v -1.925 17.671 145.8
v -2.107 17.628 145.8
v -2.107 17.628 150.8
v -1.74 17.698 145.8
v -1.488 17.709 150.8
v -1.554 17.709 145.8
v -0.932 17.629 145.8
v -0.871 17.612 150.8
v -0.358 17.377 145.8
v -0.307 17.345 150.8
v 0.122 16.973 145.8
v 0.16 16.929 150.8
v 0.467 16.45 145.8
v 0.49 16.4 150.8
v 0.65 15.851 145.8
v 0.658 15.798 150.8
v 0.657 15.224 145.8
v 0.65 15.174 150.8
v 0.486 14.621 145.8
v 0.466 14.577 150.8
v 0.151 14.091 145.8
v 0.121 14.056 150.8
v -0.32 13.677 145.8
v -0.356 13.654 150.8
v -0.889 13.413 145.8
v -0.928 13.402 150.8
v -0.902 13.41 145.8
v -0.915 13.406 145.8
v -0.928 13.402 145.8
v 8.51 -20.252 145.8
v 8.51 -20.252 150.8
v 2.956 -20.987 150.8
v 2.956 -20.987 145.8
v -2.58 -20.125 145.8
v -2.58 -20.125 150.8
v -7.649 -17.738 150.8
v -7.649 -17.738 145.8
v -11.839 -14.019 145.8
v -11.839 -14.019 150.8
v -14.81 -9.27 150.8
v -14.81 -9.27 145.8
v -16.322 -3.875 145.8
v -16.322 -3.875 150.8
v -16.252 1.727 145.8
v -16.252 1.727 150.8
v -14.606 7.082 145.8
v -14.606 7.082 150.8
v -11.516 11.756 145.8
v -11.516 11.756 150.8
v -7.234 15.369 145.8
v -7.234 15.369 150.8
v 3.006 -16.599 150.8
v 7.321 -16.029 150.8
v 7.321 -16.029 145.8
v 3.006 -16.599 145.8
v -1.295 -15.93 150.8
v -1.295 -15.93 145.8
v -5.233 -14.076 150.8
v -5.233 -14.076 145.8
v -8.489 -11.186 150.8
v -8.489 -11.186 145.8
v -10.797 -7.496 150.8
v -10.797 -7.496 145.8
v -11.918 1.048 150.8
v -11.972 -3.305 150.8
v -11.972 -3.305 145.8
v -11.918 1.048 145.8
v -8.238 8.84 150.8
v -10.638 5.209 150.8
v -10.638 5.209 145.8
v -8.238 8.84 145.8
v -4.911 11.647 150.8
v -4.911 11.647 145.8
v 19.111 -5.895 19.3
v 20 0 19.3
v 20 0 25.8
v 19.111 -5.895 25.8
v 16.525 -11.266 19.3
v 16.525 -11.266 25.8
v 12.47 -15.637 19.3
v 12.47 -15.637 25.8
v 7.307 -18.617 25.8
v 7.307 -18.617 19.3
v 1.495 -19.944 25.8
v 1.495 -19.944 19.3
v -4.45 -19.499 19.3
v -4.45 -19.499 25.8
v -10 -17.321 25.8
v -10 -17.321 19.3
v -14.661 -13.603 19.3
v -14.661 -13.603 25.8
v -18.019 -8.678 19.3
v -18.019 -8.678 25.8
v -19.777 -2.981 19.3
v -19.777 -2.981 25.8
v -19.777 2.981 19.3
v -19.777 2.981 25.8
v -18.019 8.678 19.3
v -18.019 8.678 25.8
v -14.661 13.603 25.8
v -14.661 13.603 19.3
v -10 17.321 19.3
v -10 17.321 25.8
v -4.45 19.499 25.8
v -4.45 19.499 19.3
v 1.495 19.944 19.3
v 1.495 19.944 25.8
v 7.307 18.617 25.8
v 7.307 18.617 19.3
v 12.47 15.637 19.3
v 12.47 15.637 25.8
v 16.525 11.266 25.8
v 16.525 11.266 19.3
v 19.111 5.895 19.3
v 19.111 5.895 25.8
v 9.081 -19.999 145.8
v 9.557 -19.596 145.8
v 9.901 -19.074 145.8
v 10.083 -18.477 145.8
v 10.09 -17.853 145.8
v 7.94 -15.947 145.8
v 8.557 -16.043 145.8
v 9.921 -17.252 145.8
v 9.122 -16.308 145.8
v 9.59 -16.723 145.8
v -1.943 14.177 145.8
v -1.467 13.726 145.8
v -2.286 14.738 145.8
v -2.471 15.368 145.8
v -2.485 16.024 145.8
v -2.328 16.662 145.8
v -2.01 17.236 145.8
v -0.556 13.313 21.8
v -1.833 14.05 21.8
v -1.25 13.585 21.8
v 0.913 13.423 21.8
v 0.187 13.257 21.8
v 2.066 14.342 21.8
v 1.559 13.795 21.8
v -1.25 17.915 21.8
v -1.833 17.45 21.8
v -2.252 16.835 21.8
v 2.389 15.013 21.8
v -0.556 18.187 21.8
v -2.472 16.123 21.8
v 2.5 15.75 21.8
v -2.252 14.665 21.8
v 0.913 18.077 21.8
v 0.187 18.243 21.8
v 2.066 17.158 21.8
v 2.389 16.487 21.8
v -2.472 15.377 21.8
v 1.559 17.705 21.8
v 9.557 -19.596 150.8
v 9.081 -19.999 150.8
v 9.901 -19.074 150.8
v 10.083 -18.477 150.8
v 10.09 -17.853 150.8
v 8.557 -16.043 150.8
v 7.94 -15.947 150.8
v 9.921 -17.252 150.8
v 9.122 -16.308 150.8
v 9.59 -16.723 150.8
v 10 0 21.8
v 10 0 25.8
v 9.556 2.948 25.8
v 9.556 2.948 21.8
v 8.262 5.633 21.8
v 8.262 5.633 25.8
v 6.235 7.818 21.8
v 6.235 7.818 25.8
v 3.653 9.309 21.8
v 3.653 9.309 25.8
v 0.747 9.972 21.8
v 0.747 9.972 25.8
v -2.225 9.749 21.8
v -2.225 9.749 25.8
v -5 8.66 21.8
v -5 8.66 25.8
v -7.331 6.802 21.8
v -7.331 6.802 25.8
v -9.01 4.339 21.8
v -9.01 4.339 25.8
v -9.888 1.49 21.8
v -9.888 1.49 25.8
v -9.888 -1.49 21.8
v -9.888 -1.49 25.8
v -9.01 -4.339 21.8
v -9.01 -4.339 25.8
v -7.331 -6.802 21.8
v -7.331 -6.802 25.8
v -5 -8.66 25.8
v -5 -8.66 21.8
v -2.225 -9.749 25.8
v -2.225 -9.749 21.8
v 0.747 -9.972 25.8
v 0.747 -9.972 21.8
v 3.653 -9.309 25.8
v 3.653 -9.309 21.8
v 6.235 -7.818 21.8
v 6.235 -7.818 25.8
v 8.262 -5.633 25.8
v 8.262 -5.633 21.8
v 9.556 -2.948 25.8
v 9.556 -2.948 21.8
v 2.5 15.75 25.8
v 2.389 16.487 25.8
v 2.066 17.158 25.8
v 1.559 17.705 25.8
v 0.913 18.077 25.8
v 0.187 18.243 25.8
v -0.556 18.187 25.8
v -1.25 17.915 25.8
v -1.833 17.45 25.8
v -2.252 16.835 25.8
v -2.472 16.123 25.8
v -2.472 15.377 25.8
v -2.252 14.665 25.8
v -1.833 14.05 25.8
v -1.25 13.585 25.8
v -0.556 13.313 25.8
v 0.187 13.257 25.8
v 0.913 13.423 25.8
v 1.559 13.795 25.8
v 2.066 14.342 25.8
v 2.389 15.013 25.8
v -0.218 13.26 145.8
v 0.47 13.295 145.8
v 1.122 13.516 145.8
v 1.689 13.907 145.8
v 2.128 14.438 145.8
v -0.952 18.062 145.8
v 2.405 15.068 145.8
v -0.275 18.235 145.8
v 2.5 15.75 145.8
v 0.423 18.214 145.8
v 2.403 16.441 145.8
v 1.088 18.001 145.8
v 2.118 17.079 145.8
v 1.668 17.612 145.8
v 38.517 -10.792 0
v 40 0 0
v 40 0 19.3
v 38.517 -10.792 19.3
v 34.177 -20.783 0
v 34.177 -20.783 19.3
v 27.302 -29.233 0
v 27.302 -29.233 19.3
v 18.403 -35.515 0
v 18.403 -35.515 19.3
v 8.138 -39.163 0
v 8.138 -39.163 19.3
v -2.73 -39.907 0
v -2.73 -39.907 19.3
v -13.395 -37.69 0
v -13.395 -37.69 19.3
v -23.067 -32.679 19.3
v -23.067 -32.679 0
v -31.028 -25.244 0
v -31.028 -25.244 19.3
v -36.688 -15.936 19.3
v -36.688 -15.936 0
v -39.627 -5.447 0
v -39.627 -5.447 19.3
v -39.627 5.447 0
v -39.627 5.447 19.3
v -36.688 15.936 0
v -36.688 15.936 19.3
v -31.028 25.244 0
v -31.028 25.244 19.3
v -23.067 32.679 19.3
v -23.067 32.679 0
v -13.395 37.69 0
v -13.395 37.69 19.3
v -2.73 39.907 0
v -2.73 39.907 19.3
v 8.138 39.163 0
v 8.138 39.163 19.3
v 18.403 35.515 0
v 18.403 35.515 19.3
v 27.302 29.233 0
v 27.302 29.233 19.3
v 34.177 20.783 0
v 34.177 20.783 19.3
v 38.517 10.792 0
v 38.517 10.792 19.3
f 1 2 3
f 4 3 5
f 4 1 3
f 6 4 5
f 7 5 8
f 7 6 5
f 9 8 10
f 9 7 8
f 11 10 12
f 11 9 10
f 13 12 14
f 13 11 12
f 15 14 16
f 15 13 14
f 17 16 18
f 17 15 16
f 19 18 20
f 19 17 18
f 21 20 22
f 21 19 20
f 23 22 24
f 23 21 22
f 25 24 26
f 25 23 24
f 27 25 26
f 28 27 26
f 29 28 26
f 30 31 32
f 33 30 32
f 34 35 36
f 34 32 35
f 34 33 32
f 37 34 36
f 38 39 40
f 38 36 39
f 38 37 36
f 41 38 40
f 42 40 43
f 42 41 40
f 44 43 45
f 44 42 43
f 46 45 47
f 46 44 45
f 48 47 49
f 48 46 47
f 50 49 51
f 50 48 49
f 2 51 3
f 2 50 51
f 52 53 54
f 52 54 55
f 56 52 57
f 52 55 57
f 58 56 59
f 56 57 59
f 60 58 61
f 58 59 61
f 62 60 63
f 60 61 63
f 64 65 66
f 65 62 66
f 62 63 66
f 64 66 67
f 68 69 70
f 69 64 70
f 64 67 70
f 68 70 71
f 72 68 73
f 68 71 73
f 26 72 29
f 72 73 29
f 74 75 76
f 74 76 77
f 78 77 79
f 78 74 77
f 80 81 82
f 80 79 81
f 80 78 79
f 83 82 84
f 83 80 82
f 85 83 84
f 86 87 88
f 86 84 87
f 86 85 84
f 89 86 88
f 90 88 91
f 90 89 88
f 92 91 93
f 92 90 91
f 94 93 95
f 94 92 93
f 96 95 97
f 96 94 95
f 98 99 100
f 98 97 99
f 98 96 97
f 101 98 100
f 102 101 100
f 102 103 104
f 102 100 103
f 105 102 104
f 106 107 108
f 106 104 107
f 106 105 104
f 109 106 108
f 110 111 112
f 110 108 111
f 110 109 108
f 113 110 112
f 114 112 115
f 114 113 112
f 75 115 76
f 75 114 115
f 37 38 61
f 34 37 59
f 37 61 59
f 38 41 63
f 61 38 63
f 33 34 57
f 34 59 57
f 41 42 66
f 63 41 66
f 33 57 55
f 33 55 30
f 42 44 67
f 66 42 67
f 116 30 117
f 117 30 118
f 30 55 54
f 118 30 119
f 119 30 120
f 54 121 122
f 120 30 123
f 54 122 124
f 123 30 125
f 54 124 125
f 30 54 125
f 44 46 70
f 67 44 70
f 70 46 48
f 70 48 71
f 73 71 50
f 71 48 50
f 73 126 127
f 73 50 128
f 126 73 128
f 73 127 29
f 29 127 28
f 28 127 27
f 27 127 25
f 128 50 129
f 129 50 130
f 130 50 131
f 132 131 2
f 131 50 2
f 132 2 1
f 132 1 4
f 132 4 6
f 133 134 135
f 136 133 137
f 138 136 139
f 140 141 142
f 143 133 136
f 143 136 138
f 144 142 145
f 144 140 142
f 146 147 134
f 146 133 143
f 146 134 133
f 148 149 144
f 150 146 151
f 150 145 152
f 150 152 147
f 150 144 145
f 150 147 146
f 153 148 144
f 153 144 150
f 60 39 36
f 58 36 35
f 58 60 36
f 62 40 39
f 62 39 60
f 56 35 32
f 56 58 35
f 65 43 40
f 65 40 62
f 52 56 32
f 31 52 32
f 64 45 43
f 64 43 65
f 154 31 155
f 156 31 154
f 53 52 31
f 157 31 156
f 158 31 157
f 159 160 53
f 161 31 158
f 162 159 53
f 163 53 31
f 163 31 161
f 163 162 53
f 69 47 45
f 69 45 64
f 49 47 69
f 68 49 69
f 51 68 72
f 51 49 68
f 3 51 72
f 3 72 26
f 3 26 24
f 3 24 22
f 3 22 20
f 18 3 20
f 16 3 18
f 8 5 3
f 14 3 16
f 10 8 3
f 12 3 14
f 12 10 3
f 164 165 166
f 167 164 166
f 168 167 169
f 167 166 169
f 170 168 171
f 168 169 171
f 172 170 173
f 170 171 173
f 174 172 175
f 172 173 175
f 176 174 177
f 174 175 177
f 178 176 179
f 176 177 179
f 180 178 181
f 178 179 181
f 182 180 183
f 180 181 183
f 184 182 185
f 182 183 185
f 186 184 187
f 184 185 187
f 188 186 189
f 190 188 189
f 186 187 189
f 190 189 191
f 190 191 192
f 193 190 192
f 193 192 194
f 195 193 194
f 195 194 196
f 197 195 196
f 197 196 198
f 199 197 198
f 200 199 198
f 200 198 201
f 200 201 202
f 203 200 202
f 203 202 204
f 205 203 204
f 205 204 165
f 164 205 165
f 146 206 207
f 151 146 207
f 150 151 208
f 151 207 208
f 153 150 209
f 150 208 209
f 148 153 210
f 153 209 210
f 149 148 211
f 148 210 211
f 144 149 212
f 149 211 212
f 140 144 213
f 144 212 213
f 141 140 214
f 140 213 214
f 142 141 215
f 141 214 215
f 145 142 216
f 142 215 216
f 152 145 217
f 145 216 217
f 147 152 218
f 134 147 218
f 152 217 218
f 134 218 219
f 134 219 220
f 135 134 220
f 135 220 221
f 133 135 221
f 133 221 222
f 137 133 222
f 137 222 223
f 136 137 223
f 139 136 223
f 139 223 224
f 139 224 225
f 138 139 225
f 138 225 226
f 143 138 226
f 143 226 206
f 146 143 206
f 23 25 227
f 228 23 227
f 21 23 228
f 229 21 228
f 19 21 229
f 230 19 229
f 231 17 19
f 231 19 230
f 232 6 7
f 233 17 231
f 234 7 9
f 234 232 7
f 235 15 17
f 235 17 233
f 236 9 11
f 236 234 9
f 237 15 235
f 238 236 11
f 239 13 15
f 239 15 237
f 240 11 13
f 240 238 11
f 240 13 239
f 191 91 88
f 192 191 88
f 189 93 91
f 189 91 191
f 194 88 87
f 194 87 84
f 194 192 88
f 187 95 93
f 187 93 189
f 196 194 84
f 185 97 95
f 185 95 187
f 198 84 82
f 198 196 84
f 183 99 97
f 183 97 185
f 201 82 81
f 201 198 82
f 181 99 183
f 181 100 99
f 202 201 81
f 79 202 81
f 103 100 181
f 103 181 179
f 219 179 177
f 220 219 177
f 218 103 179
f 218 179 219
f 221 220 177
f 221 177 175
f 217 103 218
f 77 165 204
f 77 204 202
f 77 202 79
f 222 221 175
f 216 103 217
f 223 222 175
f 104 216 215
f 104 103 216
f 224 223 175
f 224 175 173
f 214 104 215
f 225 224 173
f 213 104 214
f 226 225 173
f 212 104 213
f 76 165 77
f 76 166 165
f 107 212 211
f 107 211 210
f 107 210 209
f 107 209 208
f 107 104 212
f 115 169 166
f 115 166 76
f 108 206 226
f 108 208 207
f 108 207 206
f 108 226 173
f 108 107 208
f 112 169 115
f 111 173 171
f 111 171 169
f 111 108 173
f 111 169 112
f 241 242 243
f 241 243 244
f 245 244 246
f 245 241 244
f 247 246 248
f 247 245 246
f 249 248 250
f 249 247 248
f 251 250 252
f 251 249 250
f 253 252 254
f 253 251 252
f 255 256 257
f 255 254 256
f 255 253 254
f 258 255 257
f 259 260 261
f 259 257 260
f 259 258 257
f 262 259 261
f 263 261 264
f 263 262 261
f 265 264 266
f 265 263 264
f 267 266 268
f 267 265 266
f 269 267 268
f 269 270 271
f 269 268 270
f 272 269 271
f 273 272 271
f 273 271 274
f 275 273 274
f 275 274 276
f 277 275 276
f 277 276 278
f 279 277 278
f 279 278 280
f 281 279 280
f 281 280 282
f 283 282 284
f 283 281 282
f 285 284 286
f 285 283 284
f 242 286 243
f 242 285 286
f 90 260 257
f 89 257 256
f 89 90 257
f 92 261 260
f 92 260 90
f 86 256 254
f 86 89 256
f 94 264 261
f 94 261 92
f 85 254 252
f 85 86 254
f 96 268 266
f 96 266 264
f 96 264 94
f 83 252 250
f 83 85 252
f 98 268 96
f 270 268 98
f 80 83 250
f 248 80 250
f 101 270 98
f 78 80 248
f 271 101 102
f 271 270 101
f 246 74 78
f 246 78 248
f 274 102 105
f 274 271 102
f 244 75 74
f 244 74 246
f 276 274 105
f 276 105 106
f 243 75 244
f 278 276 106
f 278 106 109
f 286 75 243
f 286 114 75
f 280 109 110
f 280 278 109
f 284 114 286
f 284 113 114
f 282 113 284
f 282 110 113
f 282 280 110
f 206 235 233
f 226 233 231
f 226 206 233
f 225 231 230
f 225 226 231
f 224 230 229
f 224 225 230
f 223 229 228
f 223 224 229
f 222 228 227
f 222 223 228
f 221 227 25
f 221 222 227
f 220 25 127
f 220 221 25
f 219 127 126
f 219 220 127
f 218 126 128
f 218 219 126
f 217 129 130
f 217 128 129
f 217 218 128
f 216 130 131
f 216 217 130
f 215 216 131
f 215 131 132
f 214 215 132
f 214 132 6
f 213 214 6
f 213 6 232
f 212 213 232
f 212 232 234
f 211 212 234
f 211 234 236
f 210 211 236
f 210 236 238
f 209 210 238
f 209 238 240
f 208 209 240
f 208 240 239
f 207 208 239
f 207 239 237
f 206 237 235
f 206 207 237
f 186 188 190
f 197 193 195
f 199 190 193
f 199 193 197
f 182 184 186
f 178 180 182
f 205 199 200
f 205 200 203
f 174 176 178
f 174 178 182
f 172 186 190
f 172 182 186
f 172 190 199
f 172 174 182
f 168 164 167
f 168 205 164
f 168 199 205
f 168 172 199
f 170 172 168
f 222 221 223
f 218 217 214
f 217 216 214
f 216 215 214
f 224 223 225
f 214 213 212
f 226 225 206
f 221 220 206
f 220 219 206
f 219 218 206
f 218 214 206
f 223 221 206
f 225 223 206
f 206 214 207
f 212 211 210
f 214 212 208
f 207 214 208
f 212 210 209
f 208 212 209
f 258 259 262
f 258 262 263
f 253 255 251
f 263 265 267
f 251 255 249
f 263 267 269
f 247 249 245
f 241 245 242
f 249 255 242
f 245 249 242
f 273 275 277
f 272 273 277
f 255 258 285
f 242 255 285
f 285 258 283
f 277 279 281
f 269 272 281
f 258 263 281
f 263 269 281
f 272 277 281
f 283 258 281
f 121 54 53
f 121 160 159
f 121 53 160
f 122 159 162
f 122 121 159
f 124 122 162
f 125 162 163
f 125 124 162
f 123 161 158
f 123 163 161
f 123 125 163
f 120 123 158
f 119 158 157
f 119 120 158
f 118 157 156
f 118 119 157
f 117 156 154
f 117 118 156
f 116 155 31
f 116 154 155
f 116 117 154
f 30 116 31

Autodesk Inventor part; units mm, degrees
ref_plane "YZ Plane" through (0, 0, 0) normal (1, 0, 0) x (0, 1, 0)
ref_plane "XZ Plane" through (0, 0, 0) normal (0, 1, 0) x (-1, 0, 0)
ref_plane "XY Plane" through (0, 0, 0) normal (0, 0, 1) x (1, 0, 0)
sketch "ｽｹｯﾁ1" plane through (0, 0, 0) normal (0, 0, 1) x (1, 0, 0)
  circle A0 centre (0, 0) radius 40
  dimension "d0" = 80
extrude "Extrusion1" add sketch "ｽｹｯﾁ1" along normal blind 19.3
sketch "ｽｹｯﾁ2" plane through (0, 0, 19.3) normal (0, 0, 1) x (1, 0, 0)
  circle A0 centre (0, 0) radius 40 projected
  circle A1 centre (0, 0) radius 20
  dimension "d3" = 40
extrude "Extrusion2" add sketch "ｽｹｯﾁ2" along normal blind 6.5 contours A1
sketch "ｽｹｯﾁ3" plane through (0, 0, 25.8) normal (0, 0, 1) x (1, 0, 0)
  circle A0 centre (0, 0) radius 20 projected
  circle A1 centre (0, 0) radius 10
  line L0 (0, 0) -> (0, 15.75)
  circle A2 centre (0, 15.75) radius 2.5
  dimension "d6" = 20
  dimension "d9" = 15.75
  dimension "d10" = 5
extrude "Extrusion3" cut sketch "ｽｹｯﾁ3" against normal blind 4 contours A1 | A2
sketch "Sketch4" plane through (0, 0, 25.8) normal (0, 0, 1) x (1, 0, 0)
  circle A0 centre (0, 15.75) radius 2.5 projected
  circle A1 centre (0, 15.75) radius 2.5
  point P0 (0, 0)
extrude "Extrusion4" add sketch "Sketch4" along normal blind 120
sketch "Sketch5" plane through (0, 15.75, 145.8) normal (0, 0, 1) x (1, 0, 0)
  arc A0 (-1.5175, -0.2348) -> (7.9156, -33.8904) centre (3.1807, -17.0678) ccw construction
  arc A1 (-2.1073, 1.8781) -> (8.51, -36.0021) centre (3.1807, -17.0678) ccw
  arc A2 (-0.9278, -2.3478) -> (7.3213, -31.7788) centre (3.1807, -17.0678) ccw
  arc A3 (-0.9278, -2.3478) -> (-2.1073, 1.8781) centre (-1.5175, -0.2348) ccw
  arc A4 (8.51, -36.0021) -> (7.3213, -31.7788) centre (7.9156, -33.8904) ccw
  point P0 (0, -15.75)
extrude "Extrusion5" add sketch "Sketch5" along normal blind 5
properties part number "Robot-Axis5-Adapter"
